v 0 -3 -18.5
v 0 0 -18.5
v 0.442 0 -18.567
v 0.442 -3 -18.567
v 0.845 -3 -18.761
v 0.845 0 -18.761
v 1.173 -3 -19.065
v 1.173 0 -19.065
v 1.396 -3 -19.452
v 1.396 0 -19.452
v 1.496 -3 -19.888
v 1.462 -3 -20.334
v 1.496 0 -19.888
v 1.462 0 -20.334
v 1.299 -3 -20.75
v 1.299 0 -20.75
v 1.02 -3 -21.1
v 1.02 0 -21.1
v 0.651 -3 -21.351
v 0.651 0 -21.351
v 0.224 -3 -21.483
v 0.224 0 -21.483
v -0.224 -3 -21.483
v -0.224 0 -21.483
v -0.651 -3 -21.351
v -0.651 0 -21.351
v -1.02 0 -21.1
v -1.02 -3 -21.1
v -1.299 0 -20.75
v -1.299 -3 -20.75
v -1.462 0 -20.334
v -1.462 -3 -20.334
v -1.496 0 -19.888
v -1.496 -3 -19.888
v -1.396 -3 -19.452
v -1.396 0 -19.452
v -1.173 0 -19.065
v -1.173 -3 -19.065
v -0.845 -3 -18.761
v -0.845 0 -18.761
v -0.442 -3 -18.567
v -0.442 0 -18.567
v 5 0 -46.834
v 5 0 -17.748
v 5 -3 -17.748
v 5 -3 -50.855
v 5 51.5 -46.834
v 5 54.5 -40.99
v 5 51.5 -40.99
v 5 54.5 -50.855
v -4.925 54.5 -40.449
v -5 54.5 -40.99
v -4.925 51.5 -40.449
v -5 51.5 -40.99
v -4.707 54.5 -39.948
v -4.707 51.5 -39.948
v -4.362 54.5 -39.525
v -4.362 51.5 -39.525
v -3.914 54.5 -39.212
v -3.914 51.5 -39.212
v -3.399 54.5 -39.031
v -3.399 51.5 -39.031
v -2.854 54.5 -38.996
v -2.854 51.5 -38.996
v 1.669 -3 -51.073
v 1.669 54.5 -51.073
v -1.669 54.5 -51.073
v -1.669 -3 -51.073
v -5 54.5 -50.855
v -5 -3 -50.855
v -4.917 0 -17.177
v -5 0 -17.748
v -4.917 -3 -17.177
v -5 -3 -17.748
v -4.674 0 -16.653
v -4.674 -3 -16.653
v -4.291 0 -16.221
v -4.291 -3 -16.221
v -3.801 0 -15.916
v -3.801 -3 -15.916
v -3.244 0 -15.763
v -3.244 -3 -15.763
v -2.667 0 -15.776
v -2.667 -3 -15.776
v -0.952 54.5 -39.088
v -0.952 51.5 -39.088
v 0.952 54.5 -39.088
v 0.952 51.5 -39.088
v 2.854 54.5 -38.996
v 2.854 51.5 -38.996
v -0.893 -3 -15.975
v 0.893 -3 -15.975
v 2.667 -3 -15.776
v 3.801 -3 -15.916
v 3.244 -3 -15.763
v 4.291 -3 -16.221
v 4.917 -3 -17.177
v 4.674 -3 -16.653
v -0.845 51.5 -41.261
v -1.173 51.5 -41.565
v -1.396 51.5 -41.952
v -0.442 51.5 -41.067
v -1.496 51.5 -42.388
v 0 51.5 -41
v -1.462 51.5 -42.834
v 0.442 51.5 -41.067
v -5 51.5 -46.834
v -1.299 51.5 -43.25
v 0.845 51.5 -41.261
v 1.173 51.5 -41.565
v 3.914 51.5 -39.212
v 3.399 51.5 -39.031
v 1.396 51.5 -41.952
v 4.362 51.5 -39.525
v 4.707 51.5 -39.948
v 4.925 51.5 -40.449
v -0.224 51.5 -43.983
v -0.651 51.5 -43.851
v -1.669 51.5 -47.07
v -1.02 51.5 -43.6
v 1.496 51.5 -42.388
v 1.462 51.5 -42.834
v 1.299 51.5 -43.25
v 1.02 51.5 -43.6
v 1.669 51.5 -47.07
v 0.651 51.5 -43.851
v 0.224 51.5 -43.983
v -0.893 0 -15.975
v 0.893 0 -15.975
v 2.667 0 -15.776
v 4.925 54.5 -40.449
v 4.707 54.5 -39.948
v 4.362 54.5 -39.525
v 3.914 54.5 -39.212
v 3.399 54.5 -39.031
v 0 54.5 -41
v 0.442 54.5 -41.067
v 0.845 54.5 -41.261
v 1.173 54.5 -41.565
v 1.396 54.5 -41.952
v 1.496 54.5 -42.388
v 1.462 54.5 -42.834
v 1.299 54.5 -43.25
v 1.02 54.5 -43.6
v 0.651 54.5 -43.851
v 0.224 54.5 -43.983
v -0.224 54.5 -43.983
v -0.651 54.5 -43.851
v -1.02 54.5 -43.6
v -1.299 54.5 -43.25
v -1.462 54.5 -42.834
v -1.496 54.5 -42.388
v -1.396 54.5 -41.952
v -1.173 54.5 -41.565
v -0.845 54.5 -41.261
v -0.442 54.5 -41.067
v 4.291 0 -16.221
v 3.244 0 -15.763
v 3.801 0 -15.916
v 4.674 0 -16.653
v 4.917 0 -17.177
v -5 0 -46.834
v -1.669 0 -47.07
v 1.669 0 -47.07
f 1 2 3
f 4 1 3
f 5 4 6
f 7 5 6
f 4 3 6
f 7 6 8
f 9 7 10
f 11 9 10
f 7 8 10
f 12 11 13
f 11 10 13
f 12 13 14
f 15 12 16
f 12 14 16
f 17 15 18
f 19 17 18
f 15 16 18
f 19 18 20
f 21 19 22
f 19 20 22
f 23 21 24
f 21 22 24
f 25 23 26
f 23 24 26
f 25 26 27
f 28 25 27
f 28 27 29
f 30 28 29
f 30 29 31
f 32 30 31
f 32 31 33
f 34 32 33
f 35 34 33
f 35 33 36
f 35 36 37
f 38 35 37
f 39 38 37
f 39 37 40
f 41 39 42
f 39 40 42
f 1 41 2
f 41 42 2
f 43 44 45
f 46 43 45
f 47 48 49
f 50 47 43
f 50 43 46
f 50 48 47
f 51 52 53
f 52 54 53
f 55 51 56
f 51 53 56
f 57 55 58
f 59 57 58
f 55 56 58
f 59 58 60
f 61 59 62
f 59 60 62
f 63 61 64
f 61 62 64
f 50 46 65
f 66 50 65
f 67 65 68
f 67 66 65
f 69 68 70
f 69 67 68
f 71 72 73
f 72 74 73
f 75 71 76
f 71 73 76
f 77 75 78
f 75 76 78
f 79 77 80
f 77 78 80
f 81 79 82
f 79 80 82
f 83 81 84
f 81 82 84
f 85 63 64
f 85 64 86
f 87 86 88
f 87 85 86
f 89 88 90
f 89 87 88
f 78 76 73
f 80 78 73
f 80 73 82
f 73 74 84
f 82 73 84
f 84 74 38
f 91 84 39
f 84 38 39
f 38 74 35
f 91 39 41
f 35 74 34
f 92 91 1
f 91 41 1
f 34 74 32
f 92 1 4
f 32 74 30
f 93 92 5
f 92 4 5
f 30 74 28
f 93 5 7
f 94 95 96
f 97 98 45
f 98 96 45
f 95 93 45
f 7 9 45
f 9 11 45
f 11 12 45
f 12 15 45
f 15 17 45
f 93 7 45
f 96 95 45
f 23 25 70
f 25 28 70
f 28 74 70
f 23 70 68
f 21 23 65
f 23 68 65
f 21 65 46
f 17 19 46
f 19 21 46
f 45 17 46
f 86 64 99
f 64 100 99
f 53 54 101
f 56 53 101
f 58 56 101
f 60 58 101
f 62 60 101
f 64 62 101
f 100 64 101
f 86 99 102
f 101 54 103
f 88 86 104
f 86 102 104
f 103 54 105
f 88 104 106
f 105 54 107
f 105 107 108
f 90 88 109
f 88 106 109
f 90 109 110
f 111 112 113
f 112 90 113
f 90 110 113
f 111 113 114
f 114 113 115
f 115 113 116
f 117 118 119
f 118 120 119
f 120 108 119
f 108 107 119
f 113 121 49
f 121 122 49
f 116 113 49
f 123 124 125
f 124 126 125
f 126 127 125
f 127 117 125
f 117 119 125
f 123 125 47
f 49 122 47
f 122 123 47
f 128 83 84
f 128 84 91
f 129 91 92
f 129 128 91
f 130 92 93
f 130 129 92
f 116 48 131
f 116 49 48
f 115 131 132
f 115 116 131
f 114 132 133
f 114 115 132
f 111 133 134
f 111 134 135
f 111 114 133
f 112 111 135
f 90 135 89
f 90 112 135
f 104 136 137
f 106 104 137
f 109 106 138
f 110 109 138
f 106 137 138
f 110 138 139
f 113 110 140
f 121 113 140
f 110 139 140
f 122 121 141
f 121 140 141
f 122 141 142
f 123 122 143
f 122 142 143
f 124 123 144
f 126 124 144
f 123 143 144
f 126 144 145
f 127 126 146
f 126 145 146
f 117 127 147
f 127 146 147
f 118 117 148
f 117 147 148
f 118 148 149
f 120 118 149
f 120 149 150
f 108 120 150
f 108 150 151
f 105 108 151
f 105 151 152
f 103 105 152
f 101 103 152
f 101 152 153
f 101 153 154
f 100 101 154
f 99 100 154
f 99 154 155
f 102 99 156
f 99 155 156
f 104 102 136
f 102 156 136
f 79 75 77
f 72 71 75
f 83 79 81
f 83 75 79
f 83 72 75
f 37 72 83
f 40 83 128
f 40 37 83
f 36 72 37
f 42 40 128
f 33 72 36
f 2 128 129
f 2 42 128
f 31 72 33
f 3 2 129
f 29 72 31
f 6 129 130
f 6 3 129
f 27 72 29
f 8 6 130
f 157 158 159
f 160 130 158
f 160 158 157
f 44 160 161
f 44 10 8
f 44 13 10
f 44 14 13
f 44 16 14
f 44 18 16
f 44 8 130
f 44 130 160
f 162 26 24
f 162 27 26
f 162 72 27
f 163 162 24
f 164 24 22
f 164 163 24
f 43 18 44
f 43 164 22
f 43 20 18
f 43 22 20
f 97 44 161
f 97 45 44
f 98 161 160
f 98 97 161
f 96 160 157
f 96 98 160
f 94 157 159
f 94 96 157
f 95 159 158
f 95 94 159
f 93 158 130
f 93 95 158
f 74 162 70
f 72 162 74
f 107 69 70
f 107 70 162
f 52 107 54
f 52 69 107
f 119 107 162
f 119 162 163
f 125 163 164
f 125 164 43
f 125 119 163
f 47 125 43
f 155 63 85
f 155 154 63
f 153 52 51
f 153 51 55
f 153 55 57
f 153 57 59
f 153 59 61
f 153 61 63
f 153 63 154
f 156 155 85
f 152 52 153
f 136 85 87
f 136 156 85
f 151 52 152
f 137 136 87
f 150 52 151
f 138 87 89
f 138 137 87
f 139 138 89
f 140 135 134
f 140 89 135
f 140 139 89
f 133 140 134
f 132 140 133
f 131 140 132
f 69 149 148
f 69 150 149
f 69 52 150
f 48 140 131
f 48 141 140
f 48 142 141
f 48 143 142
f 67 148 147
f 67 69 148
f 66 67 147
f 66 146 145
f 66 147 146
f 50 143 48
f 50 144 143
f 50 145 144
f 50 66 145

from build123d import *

# Parameters (mm, degrees)
SKETCH1_R           = 1.5
BOSS_EXTRUDE1_DEPTH = 3
BOSS_EXTRUDE2_START = 51.5
BOSS_EXTRUDE2_DEPTH = 51.5
BOSS_EXTRUDE3_START = 54.5
SKETCH1_4_R         = 1.5
BOSS_EXTRUDE3_DEPTH = 3
FILLET1_R           = 2


with BuildPart() as part:
    # Sketch1 → Boss-Extrude1 (new body)
    with BuildSketch(Plane(origin=(0, 0, 0), x_dir=(1, 0, 0), z_dir=(0, 1, 0))):
        with BuildLine():
            ThreePointArc((5, 50.854793284), (0, 51.1), (-5, 50.854793284))
            Line((-5, 50.854793284), (-5, 15.198684154))
            ThreePointArc((-5, 15.198684154), (0, 16), (5, 15.198684154))
            Line((5, 15.198684154), (5, 50.854793284))
        make_face()
        with Locations((0, 20)):
            Circle(SKETCH1_R, mode=Mode.SUBTRACT)
    extrude(amount=-BOSS_EXTRUDE1_DEPTH)

    # Sketch1<3> → Boss-Extrude2 (add)
    with BuildSketch(Plane(origin=(0, 0, 0), x_dir=(1, 0, 0), z_dir=(0, 1, 0)).offset(BOSS_EXTRUDE2_START)):
        with BuildLine():
            ThreePointArc((5, 50.854793284), (0, 51.1), (-5, 50.854793284))
            Line((-5, 50.854793284), (-5, 46.833855276))
            ThreePointArc((-5, 46.833855276), (0, 47.1), (5, 46.833855276))
            Line((5, 46.833855276), (5, 50.854793284))
        make_face()
    extrude(amount=-BOSS_EXTRUDE2_DEPTH)

    # Sketch1<4> → Boss-Extrude3 (add)
    with BuildSketch(Plane(origin=(0, 0, 0), x_dir=(1, 0, 0), z_dir=(0, 1, 0)).offset(BOSS_EXTRUDE3_START)):
        with BuildLine():
            ThreePointArc((5, 50.854793284), (0, 51.1), (-5, 50.854793284))
            Line((-5, 50.854793284), (-5, 38.778989157))
            ThreePointArc((-5, 38.778989157), (0, 39.1), (5, 38.778989157))
            Line((5, 38.778989157), (5, 50.854793284))
        make_face()
        with Locations((0, 42.5)):
            Circle(SKETCH1_4_R, mode=Mode.SUBTRACT)
    extrude(amount=-BOSS_EXTRUDE3_DEPTH)

    # Fillet1
    fillet1_edges = [part.edges().sort_by_distance(p)[0] for p in [
        (-5, 53, -38.778989157),
        (5, 53, -38.778989157),
        (5, -1.5, -15.198684154),
        (-5, -1.5, -15.198684154),
    ]]
    fillet(fillet1_edges, radius=FILLET1_R)


solid = part.part
